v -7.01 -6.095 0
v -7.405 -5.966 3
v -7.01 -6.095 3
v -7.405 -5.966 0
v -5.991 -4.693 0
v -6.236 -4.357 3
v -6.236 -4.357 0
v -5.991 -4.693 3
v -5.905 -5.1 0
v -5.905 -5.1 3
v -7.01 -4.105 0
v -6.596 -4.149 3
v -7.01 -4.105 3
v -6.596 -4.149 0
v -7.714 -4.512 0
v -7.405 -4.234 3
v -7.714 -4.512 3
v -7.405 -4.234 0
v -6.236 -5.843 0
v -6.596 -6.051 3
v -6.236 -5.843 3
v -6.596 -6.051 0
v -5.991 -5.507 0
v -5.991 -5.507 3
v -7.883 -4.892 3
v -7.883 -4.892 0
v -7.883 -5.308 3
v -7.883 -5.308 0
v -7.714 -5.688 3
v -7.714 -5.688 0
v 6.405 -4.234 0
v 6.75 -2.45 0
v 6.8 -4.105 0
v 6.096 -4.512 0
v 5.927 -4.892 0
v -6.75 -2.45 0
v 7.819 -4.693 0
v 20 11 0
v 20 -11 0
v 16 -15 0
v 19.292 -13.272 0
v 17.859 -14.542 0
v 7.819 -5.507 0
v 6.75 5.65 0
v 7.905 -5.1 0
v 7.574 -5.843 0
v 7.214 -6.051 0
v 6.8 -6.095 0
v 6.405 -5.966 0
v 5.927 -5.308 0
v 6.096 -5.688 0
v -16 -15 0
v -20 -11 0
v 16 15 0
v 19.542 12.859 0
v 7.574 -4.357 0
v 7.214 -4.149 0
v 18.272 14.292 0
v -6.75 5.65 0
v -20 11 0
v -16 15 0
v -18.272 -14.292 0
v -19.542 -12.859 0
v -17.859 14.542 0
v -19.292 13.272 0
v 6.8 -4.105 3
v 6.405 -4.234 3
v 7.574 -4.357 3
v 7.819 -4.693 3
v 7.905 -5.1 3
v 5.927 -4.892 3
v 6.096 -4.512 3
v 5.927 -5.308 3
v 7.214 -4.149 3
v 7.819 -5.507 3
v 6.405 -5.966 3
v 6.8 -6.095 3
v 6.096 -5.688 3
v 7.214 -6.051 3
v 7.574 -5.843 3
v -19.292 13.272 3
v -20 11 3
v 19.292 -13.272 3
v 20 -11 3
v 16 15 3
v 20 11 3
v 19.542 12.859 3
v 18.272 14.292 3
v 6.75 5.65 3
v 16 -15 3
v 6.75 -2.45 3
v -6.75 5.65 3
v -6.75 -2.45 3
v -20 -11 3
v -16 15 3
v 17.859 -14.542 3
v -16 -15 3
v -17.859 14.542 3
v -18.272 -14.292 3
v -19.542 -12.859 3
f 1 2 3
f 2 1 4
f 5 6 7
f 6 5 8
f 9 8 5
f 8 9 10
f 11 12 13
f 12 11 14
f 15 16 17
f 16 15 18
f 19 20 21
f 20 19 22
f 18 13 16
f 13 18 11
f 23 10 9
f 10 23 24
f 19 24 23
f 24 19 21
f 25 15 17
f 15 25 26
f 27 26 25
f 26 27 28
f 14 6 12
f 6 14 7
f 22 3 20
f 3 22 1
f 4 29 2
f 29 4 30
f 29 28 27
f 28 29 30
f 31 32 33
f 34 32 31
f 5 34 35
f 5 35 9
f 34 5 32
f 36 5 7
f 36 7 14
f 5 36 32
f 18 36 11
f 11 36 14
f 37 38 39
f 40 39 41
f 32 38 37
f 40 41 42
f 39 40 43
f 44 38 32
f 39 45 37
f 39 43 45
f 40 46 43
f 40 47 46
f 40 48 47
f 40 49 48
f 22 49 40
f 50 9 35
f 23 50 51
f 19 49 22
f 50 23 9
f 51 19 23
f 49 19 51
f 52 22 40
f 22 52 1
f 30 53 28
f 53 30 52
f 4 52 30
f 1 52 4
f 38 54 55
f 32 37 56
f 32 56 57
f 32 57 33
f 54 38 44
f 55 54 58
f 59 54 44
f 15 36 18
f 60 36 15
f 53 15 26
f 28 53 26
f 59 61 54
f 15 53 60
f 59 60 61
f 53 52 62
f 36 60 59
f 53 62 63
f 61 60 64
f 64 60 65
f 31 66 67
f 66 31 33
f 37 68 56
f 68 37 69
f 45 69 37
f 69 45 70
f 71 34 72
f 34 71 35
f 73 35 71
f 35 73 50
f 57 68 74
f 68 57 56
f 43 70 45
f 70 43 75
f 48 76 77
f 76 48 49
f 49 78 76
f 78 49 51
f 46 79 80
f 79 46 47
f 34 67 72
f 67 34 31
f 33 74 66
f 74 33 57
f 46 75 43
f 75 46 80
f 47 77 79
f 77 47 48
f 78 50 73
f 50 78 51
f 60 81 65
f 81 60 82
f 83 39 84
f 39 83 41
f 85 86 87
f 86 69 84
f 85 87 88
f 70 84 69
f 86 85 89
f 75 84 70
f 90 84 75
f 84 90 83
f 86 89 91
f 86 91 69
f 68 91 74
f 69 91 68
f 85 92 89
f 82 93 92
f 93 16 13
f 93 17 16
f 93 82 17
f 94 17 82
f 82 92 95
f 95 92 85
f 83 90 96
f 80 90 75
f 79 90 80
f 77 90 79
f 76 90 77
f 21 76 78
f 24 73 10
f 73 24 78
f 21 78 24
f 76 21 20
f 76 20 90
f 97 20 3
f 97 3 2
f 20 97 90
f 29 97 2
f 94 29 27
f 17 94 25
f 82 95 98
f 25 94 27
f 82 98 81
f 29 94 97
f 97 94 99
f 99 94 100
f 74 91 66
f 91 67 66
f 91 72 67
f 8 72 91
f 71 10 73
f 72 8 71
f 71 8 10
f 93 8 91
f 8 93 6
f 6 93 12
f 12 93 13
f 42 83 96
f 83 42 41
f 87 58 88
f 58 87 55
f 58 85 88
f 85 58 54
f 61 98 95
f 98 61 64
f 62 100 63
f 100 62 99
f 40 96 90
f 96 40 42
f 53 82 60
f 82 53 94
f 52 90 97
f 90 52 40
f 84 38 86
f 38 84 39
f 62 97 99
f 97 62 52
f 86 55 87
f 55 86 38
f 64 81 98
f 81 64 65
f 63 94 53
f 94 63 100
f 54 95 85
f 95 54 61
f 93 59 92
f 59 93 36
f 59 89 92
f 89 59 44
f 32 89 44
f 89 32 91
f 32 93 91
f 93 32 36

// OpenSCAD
// ==========================
// PARAMETERS (easy to edit)
// ==========================

// Main box
BOX_W = 40;      // width  (X)
BOX_L = 30;     // length (Y)
BOX_H = 3;    
BOX_R = 4;
HOLE_INSET = 10;
HOLE_DIAM = 4.5;
HOLE_FN = 30;

CON_PINS = 2;



// Main plate with rounded corners
difference(){
    linear_extrude(BOX_H)
        offset(r = BOX_R) 
            offset(r = -BOX_R) 
                square([BOX_W, BOX_L], center = true);
                
/*                
    // Optional mounting holes (uncomment if you want them)
     translate([ BOX_W/2 - HOLE_INSET,  BOX_L/2 - HOLE_INSET, -0.1]) 
        hole_M4();
     translate([-BOX_W/2 + HOLE_INSET,  BOX_L/2 - HOLE_INSET, -0.1]) 
        hole_M4();
     translate([ BOX_W/2 - HOLE_INSET, -BOX_L/2 + HOLE_INSET, -0.1]) 
        hole_M4();
     translate([-BOX_W/2 + HOLE_INSET, -BOX_L/2 + HOLE_INSET, -0.1]) 
        hole_M4();
   */ 
    Y = -5;
    connector_holes(0,Y);
    connector_body(0,Y);
}



module connector_holes(xPos,yPos){
    X = xPos;
    Y = yPos;
    holes_between = 3.81*CON_PINS+6.19;
    
    translate( [X - holes_between/2, Y -0.1] )
        hole_M2();

    translate( [X + holes_between/2, Y -0.1] )
        hole_M2();
    
    
}

module connector_body(xPos,yPos){
    body_w = 3.81*CON_PINS+10.89;
    body_w = (CON_PINS-1)*3.5+10;
    
    body_l = 8.1;
    body_y = yPos - body_l/2;
    
    //2.55 disance between hole center and top side of body
    y = yPos + (body_l/2)+2.55;
    y = yPos+2.55;
    linear_extrude(BOX_H)
        translate( [ xPos - body_w/2, y, -0.1 ])
            square([body_w,body_l], center = false);
}

module hole_M2(){
    cylinder(h = BOX_H + 0.2, d = 2, $fn=15);
}


module hole_M3(){
    cylinder(h = BOX_H + 0.2, d = 3.5, $fn=HOLE_FN);
}


module hole_M4() {
    cylinder(h = BOX_H + 0.2, d = HOLE_DIAM, $fn=HOLE_FN);
}
